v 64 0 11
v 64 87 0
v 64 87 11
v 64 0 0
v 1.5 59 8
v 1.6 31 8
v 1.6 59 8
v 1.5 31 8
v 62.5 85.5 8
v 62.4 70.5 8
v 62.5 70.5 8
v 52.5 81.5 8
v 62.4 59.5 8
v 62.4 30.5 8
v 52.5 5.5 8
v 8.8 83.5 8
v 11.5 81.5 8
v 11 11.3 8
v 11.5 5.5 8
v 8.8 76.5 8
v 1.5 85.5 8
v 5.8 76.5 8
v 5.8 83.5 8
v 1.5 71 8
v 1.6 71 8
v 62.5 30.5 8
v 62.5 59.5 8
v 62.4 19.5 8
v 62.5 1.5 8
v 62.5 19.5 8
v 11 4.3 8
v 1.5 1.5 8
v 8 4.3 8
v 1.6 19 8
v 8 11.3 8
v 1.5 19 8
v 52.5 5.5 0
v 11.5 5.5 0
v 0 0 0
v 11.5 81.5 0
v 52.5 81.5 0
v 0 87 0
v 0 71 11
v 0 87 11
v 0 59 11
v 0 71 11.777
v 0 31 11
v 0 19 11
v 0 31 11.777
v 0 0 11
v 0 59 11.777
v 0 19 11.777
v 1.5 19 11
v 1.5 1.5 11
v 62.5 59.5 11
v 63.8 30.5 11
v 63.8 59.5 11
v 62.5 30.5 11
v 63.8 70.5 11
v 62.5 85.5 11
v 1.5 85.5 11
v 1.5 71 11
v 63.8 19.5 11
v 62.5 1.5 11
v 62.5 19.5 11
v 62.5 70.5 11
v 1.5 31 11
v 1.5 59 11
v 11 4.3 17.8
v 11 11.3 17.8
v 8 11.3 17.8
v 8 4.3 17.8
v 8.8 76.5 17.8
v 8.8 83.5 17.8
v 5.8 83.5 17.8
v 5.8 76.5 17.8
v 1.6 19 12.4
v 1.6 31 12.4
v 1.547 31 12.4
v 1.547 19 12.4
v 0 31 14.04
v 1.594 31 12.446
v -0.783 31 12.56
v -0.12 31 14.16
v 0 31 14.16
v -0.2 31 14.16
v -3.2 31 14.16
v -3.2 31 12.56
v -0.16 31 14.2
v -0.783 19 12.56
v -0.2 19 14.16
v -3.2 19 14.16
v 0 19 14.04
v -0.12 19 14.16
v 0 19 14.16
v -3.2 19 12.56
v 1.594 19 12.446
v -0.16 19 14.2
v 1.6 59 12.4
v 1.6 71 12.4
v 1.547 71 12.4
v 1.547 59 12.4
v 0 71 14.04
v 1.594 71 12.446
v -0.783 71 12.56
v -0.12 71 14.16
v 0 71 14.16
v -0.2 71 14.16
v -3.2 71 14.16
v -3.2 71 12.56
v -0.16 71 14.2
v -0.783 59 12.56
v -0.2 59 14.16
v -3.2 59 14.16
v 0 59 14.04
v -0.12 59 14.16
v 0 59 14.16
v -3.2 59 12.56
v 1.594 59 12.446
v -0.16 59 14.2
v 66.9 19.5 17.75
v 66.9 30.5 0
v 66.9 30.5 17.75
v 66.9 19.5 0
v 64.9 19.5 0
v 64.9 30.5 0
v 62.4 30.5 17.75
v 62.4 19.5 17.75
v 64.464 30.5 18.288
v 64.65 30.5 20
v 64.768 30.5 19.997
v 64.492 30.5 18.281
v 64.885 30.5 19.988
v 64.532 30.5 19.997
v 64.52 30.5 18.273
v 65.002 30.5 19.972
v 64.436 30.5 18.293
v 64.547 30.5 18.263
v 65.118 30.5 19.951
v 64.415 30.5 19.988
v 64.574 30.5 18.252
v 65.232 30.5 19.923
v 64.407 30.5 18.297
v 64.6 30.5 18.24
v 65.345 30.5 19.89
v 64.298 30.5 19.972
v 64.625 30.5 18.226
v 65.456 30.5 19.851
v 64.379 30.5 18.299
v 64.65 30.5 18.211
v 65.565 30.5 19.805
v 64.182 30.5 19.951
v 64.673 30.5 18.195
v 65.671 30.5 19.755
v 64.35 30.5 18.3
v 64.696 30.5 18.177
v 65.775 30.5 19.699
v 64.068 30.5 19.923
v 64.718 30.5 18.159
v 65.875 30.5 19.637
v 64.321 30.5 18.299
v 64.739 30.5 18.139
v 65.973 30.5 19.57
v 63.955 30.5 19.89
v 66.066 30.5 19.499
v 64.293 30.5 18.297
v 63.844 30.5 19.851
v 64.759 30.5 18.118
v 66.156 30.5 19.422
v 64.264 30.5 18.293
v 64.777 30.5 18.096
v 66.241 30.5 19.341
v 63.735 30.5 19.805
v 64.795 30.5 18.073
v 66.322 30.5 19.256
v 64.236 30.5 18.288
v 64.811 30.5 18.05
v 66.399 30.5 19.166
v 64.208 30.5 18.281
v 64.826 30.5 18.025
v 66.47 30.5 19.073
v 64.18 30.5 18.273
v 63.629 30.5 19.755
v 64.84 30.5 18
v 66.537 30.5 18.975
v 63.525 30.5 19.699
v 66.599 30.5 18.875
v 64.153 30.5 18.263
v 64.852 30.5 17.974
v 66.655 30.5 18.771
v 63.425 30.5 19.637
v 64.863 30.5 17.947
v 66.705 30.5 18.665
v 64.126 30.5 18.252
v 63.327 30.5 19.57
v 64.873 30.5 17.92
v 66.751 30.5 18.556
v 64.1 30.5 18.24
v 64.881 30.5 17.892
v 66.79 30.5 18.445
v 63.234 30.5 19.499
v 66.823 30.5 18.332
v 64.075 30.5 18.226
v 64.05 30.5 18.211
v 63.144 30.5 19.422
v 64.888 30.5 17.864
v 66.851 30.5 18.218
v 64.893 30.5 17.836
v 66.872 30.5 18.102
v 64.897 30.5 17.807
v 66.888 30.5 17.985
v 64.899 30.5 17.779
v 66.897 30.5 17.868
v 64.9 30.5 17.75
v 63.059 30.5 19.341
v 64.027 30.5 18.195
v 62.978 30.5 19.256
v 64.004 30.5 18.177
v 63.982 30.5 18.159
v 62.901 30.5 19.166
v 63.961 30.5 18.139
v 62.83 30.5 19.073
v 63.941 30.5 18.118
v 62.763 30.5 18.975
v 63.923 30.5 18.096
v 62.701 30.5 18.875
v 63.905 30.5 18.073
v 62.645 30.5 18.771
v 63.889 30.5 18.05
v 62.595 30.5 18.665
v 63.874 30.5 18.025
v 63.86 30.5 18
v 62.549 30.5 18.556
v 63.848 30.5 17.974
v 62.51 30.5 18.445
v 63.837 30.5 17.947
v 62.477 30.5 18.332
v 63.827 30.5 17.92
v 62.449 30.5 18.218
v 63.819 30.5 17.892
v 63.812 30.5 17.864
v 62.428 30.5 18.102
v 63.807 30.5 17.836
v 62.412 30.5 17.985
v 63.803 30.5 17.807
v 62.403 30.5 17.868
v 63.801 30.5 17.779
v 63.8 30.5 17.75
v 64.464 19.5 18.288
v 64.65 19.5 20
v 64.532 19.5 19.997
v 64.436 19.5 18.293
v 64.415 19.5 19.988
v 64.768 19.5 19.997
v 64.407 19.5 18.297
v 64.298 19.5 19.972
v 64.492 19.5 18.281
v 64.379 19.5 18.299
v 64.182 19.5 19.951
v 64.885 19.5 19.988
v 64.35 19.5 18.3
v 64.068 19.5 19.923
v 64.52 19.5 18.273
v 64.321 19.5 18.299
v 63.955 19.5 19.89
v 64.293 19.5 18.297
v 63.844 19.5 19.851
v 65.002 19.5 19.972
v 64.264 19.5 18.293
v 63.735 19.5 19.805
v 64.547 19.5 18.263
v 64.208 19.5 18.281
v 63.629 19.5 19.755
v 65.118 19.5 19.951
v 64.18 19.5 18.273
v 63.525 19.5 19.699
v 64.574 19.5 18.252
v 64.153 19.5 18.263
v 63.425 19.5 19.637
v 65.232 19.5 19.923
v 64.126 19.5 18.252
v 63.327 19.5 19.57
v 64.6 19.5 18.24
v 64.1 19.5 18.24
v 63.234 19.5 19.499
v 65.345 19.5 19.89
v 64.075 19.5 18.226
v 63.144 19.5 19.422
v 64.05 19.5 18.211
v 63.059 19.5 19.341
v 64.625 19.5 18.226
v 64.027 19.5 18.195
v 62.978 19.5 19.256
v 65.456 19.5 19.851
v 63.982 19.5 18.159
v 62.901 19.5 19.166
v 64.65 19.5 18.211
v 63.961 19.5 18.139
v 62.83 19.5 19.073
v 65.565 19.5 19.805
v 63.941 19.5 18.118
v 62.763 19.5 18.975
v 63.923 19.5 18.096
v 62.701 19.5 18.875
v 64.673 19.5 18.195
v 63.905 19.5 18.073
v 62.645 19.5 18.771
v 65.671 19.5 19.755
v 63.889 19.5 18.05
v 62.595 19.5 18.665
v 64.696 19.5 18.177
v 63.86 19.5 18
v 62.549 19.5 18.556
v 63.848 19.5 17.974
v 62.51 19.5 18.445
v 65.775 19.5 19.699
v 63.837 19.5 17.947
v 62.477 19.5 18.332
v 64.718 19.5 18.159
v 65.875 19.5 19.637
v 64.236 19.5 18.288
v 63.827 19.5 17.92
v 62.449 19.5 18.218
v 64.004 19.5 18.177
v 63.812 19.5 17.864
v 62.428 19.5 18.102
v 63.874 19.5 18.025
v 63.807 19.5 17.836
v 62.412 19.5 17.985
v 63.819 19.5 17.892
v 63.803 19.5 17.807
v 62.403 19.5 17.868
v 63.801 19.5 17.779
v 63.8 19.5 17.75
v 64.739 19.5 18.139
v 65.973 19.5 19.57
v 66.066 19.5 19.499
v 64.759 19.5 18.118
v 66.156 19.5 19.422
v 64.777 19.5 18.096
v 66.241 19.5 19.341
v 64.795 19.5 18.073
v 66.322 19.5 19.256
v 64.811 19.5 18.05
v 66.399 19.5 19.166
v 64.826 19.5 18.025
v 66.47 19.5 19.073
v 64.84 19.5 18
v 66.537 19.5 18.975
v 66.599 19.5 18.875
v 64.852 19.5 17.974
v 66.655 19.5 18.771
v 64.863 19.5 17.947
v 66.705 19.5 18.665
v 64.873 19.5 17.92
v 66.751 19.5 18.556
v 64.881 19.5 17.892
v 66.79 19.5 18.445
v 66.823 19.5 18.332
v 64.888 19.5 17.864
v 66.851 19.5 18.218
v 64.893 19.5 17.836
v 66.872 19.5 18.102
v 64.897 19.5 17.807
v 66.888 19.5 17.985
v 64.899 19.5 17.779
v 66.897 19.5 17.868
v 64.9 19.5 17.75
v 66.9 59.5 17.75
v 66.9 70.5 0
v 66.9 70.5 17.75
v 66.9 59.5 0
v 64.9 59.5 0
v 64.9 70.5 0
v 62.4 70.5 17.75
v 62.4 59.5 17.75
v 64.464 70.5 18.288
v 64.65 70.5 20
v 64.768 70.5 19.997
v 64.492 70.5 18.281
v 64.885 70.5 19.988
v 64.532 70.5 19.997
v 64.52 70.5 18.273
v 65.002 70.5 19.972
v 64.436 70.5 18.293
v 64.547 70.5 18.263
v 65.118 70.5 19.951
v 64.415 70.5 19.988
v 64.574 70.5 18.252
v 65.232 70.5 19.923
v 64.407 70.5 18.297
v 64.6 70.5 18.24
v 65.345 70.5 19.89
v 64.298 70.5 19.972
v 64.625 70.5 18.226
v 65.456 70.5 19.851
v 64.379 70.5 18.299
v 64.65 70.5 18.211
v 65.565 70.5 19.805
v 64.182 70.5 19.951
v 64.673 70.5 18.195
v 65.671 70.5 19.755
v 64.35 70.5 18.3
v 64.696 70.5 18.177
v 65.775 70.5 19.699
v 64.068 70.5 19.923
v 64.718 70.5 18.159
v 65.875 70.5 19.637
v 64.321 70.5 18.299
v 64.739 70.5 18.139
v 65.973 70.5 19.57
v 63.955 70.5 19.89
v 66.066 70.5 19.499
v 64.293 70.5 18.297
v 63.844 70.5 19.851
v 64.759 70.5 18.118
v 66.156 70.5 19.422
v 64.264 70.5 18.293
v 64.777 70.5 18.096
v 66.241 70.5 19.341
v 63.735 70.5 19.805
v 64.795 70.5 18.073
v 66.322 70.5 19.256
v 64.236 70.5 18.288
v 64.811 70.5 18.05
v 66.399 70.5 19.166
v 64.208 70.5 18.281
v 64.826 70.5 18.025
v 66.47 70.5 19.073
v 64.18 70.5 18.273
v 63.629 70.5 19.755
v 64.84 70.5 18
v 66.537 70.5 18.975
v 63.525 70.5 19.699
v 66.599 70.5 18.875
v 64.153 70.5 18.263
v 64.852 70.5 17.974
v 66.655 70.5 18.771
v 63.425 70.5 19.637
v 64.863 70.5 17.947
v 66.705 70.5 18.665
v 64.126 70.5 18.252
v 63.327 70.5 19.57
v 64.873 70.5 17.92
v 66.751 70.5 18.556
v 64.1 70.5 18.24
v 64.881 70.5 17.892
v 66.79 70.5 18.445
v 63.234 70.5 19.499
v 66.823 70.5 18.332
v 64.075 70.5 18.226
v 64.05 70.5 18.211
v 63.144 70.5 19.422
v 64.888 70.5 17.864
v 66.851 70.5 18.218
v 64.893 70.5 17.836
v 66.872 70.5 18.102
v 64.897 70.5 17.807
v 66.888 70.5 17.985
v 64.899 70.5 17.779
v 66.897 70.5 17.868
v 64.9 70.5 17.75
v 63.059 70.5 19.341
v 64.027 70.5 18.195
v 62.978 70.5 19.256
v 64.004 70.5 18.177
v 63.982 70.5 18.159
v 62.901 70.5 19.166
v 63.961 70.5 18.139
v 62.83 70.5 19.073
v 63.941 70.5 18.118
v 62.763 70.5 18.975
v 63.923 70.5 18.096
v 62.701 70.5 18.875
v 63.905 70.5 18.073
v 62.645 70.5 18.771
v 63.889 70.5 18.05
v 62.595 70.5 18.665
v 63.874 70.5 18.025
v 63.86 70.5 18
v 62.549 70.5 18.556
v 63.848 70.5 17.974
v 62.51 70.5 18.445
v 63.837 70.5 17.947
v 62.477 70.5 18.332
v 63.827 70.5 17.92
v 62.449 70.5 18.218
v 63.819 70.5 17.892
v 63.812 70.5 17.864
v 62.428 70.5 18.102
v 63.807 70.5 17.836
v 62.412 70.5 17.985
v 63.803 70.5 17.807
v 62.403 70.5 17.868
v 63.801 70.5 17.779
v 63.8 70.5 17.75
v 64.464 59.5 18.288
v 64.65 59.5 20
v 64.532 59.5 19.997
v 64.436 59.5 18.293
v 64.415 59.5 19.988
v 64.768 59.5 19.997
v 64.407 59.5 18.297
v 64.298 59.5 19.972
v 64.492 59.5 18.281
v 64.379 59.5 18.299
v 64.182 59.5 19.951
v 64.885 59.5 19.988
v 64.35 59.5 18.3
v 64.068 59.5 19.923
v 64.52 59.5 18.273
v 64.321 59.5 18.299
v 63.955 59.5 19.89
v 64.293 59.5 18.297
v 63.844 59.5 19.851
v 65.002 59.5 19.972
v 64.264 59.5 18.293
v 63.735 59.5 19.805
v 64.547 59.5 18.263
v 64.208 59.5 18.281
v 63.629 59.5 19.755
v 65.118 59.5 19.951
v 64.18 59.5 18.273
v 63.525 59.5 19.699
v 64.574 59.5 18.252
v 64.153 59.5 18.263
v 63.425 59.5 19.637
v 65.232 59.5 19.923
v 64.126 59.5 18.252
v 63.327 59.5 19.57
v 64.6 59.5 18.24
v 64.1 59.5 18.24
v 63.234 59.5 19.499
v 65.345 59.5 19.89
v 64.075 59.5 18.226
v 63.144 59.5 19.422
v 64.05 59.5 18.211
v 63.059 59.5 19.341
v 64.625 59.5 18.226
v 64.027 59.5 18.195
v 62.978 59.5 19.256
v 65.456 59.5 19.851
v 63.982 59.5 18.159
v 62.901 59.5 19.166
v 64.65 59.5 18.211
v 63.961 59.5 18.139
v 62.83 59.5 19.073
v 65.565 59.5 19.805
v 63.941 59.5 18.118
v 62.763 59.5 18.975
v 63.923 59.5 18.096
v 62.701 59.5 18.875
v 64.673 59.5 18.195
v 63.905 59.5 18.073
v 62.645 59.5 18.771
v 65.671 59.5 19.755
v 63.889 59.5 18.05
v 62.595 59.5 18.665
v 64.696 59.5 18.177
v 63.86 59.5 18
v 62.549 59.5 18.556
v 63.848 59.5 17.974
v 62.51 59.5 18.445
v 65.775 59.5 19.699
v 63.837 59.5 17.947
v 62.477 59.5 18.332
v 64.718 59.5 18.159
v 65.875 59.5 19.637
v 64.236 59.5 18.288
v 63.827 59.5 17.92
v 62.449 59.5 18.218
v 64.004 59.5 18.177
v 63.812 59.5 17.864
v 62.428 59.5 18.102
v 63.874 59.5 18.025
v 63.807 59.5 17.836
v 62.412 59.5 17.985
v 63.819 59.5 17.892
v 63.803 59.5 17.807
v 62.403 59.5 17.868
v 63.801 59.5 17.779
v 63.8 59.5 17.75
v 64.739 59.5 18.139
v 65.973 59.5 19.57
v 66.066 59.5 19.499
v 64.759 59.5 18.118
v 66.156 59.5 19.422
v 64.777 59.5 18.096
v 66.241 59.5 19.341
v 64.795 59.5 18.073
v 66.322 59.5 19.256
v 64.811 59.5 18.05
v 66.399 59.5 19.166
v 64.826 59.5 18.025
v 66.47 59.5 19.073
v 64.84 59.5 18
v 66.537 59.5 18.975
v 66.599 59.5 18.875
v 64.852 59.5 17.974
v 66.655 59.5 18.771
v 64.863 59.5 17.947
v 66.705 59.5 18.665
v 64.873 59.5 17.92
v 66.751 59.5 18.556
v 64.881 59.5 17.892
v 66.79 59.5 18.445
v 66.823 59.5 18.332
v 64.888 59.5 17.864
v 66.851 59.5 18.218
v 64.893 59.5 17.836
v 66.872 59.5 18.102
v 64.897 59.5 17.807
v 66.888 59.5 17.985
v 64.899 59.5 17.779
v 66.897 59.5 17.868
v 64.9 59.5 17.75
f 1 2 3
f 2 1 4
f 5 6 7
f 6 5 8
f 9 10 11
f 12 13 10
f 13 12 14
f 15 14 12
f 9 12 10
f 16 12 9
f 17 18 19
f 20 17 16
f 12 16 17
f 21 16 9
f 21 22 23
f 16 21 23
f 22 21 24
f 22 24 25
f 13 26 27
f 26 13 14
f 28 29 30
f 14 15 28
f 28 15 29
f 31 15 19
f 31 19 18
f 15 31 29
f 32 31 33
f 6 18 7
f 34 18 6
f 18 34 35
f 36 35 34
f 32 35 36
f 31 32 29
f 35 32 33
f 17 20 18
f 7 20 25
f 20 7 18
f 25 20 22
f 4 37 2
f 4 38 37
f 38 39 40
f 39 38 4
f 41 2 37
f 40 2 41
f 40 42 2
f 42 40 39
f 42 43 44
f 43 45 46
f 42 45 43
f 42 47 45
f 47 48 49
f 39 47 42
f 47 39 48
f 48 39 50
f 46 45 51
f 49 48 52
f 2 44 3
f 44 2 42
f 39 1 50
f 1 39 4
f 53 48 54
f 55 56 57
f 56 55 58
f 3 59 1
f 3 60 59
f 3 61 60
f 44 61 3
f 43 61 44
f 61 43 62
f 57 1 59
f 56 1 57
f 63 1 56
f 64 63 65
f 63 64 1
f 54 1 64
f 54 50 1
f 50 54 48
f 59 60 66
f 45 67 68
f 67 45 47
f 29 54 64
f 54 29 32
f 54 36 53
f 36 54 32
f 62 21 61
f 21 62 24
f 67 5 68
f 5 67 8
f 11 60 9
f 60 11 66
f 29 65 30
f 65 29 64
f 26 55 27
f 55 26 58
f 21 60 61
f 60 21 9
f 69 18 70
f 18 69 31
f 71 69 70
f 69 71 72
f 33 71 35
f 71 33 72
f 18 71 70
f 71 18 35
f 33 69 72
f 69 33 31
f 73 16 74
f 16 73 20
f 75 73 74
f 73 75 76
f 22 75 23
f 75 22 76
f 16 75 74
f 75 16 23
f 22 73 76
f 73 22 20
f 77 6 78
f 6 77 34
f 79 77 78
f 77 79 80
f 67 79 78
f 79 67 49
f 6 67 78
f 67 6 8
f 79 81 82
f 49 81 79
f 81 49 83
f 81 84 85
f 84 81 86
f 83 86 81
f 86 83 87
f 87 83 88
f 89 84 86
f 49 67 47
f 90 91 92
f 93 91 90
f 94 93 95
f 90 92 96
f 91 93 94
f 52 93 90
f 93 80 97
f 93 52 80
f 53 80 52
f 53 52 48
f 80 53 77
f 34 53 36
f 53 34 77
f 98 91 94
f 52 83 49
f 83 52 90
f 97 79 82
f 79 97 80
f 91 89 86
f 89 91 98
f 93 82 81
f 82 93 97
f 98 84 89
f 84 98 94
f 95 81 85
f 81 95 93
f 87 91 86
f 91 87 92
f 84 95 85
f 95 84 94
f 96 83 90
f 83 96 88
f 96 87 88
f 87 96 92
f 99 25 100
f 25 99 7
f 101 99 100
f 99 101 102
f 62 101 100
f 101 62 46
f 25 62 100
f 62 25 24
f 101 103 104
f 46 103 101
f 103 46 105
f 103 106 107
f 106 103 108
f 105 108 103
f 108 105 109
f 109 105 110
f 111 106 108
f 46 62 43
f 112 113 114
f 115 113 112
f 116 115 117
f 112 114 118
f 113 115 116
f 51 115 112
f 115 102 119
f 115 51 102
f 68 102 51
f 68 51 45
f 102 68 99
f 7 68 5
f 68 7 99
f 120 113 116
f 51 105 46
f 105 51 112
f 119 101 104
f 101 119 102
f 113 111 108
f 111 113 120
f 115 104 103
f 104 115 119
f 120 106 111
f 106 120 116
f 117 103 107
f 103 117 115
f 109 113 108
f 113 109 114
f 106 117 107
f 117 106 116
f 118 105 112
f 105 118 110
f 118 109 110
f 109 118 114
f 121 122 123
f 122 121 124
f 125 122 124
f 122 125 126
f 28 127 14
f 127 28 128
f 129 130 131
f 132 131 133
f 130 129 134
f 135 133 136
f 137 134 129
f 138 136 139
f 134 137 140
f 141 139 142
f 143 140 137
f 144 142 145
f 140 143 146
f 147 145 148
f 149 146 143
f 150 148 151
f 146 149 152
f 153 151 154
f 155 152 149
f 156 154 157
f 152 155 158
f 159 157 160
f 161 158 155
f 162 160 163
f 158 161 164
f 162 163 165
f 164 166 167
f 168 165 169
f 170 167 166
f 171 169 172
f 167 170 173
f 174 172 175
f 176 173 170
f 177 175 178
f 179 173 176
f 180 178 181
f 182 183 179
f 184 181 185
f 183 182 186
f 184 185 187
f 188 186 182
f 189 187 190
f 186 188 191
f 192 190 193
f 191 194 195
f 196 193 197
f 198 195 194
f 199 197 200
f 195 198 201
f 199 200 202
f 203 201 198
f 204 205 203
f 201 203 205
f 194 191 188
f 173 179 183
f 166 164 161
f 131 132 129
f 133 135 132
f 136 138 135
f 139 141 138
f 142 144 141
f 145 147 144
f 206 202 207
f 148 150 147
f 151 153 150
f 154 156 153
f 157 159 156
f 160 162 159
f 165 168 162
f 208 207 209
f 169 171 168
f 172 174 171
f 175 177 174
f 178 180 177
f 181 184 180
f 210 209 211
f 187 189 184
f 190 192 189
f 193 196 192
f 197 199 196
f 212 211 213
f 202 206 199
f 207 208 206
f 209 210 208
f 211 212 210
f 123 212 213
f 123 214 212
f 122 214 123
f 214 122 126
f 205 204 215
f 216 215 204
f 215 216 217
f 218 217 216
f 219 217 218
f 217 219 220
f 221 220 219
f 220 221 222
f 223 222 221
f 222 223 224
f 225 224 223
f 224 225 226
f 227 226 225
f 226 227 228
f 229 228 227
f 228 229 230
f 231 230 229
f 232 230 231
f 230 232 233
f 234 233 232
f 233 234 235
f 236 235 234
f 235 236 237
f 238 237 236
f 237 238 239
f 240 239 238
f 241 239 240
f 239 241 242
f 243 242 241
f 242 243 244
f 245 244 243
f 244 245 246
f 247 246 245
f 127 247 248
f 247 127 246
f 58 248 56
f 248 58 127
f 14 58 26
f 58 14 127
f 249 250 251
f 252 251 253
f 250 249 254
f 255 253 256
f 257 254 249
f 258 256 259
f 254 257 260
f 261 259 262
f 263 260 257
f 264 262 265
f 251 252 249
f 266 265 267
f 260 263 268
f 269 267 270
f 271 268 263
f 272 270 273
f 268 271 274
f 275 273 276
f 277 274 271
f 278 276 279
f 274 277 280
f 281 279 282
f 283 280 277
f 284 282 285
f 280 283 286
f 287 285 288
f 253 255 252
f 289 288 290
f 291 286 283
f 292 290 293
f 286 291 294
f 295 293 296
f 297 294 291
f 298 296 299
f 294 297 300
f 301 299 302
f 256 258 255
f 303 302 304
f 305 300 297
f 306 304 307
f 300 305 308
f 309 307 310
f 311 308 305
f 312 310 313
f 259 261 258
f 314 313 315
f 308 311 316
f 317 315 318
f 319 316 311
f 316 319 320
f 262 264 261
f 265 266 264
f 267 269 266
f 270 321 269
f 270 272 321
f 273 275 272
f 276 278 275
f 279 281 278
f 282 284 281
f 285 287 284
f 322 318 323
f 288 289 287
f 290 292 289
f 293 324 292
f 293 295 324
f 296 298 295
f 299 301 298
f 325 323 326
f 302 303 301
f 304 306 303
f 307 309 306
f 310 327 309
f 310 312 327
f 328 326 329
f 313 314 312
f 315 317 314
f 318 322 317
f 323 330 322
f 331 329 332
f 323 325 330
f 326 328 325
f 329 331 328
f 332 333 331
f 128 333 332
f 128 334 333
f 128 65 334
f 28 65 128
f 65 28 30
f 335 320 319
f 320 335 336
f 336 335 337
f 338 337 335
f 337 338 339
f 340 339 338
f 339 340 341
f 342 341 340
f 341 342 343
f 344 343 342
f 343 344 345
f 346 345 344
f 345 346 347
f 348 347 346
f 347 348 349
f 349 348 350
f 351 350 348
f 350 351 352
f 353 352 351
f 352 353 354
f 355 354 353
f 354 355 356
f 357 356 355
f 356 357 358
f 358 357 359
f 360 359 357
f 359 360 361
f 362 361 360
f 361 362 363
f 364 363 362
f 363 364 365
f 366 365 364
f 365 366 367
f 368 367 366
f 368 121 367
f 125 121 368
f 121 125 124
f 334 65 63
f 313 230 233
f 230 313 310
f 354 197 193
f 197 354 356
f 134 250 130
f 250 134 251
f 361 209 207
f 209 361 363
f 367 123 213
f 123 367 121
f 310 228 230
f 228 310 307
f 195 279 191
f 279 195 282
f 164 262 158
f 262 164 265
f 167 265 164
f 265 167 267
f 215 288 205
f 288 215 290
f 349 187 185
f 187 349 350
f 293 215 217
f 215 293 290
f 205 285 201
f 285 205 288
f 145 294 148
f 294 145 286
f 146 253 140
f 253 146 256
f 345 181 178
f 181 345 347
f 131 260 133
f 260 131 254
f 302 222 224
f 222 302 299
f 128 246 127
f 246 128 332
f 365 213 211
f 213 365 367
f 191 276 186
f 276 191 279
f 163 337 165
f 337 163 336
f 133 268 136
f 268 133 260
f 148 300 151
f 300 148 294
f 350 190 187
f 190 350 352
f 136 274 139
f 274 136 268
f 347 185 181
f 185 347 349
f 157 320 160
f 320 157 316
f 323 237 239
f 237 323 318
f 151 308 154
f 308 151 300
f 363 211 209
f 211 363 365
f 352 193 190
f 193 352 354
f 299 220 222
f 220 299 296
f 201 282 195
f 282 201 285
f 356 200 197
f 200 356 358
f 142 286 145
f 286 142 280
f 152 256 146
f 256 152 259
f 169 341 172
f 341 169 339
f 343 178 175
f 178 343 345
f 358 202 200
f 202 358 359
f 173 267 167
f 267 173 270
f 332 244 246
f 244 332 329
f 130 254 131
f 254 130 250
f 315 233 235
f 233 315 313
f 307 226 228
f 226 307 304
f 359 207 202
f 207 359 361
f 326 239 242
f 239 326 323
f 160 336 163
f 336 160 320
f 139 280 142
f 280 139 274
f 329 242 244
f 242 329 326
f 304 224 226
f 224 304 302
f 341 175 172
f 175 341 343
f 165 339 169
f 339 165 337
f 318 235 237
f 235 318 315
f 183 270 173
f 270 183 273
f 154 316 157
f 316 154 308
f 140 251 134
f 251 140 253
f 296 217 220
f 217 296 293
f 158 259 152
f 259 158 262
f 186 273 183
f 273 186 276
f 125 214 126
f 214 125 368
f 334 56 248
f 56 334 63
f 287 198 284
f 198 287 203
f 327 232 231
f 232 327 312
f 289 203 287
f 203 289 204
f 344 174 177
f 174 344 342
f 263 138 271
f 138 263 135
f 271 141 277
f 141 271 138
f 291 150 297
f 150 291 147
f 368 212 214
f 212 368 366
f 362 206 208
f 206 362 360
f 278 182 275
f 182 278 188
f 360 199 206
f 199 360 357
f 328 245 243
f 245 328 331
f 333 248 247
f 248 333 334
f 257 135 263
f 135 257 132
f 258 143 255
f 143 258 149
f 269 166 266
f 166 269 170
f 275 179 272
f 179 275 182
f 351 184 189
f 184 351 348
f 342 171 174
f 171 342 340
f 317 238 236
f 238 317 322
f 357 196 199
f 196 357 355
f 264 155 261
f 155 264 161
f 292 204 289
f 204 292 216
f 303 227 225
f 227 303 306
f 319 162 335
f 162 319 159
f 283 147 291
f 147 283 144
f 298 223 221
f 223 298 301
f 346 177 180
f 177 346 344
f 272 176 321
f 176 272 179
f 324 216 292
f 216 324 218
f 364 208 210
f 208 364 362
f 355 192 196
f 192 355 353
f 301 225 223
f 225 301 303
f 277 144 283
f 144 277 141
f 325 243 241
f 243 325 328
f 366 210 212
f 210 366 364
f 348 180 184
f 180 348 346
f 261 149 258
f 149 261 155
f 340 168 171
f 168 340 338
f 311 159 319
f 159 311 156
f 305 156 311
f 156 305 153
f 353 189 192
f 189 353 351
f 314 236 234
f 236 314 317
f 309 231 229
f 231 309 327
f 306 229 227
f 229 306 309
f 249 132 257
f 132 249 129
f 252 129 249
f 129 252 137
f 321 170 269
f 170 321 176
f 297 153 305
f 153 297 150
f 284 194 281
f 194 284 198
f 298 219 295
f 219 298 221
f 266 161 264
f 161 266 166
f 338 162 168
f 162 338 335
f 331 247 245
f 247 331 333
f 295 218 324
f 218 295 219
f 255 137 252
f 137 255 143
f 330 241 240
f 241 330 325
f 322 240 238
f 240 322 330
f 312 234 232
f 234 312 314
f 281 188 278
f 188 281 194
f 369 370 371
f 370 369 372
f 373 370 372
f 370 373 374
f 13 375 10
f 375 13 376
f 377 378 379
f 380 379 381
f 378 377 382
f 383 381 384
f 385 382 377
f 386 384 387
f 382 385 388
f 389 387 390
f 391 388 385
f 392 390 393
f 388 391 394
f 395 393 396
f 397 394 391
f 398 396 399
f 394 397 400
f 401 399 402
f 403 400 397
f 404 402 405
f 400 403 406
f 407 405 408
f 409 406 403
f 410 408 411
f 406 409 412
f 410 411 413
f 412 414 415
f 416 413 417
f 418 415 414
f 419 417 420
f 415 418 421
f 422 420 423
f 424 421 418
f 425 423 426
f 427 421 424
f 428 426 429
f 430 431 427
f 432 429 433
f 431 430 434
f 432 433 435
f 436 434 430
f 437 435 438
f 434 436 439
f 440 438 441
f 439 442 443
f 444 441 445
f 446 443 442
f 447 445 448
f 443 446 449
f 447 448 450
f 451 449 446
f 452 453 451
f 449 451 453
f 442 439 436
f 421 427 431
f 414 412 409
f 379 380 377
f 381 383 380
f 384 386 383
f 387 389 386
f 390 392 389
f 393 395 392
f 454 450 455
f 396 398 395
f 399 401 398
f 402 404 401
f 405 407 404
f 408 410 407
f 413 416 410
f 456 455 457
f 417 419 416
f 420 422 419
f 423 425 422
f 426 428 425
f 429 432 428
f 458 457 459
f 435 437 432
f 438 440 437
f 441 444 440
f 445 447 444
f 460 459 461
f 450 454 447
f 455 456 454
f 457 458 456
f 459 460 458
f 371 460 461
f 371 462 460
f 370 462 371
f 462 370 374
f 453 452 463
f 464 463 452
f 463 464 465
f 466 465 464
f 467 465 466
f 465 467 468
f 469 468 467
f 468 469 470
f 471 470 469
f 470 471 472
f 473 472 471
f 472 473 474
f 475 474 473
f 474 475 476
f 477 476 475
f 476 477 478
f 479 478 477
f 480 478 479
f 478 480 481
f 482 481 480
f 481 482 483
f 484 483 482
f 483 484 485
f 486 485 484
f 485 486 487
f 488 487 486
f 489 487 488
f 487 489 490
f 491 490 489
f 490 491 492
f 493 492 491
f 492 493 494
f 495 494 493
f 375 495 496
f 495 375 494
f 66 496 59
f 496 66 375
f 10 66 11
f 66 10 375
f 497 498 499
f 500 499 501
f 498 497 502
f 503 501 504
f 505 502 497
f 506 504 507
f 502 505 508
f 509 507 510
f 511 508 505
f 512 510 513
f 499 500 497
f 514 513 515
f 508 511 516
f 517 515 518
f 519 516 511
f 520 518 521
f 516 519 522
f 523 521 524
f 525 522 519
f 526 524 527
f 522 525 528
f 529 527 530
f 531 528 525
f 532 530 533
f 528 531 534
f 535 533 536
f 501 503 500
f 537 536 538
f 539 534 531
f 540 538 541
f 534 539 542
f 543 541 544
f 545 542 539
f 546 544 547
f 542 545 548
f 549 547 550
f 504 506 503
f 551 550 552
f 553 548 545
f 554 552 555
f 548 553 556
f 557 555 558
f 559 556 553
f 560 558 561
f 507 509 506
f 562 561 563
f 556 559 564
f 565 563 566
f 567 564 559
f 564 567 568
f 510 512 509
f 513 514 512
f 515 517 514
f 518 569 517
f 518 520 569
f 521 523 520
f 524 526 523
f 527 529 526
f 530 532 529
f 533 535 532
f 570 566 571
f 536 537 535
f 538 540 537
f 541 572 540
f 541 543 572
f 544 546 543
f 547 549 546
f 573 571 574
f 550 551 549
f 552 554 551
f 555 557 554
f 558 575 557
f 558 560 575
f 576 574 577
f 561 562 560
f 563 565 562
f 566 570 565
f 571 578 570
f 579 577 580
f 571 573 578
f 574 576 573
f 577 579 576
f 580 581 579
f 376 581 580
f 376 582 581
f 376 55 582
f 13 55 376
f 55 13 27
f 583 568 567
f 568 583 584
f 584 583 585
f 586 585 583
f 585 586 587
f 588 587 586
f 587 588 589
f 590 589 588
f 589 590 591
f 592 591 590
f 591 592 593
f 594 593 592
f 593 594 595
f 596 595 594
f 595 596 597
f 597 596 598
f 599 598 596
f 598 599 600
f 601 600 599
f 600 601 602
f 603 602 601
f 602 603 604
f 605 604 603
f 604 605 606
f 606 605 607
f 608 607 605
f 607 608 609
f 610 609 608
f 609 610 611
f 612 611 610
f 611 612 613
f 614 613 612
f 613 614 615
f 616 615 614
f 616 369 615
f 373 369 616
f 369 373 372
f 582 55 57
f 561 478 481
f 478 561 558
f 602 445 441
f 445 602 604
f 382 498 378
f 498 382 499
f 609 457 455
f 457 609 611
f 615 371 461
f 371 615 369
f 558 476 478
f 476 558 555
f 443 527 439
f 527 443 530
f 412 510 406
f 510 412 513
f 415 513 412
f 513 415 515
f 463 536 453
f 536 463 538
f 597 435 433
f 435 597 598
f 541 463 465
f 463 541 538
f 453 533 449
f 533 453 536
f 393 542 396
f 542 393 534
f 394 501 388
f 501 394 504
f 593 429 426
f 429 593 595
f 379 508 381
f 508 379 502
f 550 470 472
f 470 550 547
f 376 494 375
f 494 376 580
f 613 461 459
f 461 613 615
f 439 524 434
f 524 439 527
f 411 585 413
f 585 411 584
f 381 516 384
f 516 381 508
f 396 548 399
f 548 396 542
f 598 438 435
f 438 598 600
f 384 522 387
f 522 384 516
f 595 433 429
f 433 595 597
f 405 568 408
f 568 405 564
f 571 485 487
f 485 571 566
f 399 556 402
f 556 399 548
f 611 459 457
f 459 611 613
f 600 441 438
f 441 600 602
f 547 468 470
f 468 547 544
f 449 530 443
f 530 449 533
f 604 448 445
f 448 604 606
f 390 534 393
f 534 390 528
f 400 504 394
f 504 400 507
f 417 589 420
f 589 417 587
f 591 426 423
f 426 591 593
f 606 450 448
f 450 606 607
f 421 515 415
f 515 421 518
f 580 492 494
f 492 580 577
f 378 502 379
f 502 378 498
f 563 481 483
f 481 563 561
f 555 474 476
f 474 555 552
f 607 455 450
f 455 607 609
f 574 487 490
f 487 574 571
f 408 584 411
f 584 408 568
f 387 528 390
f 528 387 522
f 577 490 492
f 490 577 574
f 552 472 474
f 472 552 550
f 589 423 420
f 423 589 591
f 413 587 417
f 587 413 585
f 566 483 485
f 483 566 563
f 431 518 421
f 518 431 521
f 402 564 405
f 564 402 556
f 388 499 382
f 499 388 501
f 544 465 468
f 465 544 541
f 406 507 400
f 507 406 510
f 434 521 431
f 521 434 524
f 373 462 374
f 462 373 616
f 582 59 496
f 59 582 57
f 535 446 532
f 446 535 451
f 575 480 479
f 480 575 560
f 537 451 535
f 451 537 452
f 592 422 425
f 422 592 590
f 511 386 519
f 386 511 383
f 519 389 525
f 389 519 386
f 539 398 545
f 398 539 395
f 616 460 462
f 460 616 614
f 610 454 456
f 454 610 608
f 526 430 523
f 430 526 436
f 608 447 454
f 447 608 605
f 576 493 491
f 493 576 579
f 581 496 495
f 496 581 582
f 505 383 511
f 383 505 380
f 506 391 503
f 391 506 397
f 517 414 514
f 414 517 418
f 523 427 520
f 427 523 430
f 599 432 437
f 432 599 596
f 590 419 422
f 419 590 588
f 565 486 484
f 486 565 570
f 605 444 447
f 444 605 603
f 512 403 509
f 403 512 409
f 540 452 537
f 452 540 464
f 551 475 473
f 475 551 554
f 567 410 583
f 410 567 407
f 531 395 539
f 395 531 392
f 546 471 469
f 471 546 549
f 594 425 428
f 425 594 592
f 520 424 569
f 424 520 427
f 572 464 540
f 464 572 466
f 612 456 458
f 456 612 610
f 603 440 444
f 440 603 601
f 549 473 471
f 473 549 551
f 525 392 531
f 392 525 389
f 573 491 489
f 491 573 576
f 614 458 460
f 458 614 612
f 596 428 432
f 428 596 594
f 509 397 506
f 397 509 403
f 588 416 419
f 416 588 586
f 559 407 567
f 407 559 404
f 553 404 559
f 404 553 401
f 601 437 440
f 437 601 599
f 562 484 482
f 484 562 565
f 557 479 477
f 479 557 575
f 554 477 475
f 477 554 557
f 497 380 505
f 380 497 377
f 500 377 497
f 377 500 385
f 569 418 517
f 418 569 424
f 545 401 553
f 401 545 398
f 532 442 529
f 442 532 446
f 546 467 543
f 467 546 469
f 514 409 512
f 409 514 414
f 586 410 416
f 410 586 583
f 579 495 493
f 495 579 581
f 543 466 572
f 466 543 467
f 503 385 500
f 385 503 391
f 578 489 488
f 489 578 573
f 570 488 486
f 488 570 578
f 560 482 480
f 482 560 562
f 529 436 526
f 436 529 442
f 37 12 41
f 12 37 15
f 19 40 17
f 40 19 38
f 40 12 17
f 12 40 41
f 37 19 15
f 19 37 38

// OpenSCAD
// ramecek
fullx = 64;
fully = 87;
fullz = 8;
// klec na 2x LiIon 18650
bkx = 41;
bky = 76;
bkz = 23;
// obrysovy ramecek
orstena = 1.5;
orz = 3;

// kontakt baterie na strane pevnych uchytu
batxminus = 8;
batxplus = 5.8;
batx = 3;
baty = 7;
batyminus = 7.8;
batyplus = 80;
batz = 10;
batzzero = 7.8;

// ohyby pro pant 
pantypos1 = 25;
pantypos2 = 65;
panty = 12;
pantz = fullz+orz+3;
pantd = 1.6;
panto = 1.5;

// spony: obracene U vyska 9mm, sirka 12mm hloubka 5mm
sponax = 4.5;
sponay = 11;
sponaz = 9;
sponad = 1.7;


posxvypl = (fullx - bkx)/2;
posyvypl = (fully - bky)/2;
poszvypl = 0;

module zaklblok() {
   cube([fullx,fully,fullz]);
   translate([0,0,fullz]) { cube([fullx,orstena,orz]);}
   translate([0,0,fullz]) { cube([orstena,fully,orz]);}
   translate([fullx-orstena,0,fullz]) { cube([orstena,fully,orz]);}
   translate([0,fully-orstena,fullz]) { cube([fullx,orstena,orz]);}
}

module batconn() {
   translate([batxminus,batyminus - baty/2,batzzero]) cube([batx,baty,batz]);
   translate([batxplus,(batyplus-baty/2),batzzero]) cube([batx,baty,batz]);
}

module pant() {
  cube([pantd,panty,pantz-pantd]);
  translate([-pantd*0.1,0,pantz+0.2]) rotate([0,135,0]) cube([pantd,panty,pantd*1.55]);
  translate([-2*pantd,0,pantz-pantd*0.9]) cube([2*pantd,panty,pantd]); 
}

module panty() {
   translate([0,pantypos1 - panty/2,0]) pant();
   translate([0,pantypos2 - panty/2,0]) pant();
}

module spony() {
 translate([fullx-pantd,pantypos1 - sponay/2,0]) spona();
 translate([fullx-pantd,pantypos2 - sponay/2,0]) spona();   
}
module spona() {
    difference() {
      union() {  // plna cast
        cube([sponax,sponay,fullz+orz+sponaz-sponax/2]);
        translate([sponax/2,0,fullz+orz+sponaz-sponax/2])
          rotate([270,0,0])
            cylinder(h=sponay,d=sponax,$fn=120);
      }
      union() {  // odebrana cast
        translate([sponax/2-sponad/2,0,0]) {
          cube([sponax-2*sponad,sponay,fullz+orz+sponaz-sponax/2]);
          translate([sponax/2-sponad,0,fullz+orz+sponaz-sponax/2])
            rotate([270,0,0])
              cylinder(h=sponay,d=sponax-2*sponad,$fn=120);  
        }
       }              
      }
}

module drzak() { 
difference() {
  union(){  
    zaklblok();
    batconn();  
    panty();
    spony();  
   }  
  union() {
    translate([posxvypl,posyvypl,poszvypl])
      cube([fullx-2*posxvypl,fully-2*posyvypl,fullz]);
      }
  }
}
  
drzak();
//pant();
//spona();
